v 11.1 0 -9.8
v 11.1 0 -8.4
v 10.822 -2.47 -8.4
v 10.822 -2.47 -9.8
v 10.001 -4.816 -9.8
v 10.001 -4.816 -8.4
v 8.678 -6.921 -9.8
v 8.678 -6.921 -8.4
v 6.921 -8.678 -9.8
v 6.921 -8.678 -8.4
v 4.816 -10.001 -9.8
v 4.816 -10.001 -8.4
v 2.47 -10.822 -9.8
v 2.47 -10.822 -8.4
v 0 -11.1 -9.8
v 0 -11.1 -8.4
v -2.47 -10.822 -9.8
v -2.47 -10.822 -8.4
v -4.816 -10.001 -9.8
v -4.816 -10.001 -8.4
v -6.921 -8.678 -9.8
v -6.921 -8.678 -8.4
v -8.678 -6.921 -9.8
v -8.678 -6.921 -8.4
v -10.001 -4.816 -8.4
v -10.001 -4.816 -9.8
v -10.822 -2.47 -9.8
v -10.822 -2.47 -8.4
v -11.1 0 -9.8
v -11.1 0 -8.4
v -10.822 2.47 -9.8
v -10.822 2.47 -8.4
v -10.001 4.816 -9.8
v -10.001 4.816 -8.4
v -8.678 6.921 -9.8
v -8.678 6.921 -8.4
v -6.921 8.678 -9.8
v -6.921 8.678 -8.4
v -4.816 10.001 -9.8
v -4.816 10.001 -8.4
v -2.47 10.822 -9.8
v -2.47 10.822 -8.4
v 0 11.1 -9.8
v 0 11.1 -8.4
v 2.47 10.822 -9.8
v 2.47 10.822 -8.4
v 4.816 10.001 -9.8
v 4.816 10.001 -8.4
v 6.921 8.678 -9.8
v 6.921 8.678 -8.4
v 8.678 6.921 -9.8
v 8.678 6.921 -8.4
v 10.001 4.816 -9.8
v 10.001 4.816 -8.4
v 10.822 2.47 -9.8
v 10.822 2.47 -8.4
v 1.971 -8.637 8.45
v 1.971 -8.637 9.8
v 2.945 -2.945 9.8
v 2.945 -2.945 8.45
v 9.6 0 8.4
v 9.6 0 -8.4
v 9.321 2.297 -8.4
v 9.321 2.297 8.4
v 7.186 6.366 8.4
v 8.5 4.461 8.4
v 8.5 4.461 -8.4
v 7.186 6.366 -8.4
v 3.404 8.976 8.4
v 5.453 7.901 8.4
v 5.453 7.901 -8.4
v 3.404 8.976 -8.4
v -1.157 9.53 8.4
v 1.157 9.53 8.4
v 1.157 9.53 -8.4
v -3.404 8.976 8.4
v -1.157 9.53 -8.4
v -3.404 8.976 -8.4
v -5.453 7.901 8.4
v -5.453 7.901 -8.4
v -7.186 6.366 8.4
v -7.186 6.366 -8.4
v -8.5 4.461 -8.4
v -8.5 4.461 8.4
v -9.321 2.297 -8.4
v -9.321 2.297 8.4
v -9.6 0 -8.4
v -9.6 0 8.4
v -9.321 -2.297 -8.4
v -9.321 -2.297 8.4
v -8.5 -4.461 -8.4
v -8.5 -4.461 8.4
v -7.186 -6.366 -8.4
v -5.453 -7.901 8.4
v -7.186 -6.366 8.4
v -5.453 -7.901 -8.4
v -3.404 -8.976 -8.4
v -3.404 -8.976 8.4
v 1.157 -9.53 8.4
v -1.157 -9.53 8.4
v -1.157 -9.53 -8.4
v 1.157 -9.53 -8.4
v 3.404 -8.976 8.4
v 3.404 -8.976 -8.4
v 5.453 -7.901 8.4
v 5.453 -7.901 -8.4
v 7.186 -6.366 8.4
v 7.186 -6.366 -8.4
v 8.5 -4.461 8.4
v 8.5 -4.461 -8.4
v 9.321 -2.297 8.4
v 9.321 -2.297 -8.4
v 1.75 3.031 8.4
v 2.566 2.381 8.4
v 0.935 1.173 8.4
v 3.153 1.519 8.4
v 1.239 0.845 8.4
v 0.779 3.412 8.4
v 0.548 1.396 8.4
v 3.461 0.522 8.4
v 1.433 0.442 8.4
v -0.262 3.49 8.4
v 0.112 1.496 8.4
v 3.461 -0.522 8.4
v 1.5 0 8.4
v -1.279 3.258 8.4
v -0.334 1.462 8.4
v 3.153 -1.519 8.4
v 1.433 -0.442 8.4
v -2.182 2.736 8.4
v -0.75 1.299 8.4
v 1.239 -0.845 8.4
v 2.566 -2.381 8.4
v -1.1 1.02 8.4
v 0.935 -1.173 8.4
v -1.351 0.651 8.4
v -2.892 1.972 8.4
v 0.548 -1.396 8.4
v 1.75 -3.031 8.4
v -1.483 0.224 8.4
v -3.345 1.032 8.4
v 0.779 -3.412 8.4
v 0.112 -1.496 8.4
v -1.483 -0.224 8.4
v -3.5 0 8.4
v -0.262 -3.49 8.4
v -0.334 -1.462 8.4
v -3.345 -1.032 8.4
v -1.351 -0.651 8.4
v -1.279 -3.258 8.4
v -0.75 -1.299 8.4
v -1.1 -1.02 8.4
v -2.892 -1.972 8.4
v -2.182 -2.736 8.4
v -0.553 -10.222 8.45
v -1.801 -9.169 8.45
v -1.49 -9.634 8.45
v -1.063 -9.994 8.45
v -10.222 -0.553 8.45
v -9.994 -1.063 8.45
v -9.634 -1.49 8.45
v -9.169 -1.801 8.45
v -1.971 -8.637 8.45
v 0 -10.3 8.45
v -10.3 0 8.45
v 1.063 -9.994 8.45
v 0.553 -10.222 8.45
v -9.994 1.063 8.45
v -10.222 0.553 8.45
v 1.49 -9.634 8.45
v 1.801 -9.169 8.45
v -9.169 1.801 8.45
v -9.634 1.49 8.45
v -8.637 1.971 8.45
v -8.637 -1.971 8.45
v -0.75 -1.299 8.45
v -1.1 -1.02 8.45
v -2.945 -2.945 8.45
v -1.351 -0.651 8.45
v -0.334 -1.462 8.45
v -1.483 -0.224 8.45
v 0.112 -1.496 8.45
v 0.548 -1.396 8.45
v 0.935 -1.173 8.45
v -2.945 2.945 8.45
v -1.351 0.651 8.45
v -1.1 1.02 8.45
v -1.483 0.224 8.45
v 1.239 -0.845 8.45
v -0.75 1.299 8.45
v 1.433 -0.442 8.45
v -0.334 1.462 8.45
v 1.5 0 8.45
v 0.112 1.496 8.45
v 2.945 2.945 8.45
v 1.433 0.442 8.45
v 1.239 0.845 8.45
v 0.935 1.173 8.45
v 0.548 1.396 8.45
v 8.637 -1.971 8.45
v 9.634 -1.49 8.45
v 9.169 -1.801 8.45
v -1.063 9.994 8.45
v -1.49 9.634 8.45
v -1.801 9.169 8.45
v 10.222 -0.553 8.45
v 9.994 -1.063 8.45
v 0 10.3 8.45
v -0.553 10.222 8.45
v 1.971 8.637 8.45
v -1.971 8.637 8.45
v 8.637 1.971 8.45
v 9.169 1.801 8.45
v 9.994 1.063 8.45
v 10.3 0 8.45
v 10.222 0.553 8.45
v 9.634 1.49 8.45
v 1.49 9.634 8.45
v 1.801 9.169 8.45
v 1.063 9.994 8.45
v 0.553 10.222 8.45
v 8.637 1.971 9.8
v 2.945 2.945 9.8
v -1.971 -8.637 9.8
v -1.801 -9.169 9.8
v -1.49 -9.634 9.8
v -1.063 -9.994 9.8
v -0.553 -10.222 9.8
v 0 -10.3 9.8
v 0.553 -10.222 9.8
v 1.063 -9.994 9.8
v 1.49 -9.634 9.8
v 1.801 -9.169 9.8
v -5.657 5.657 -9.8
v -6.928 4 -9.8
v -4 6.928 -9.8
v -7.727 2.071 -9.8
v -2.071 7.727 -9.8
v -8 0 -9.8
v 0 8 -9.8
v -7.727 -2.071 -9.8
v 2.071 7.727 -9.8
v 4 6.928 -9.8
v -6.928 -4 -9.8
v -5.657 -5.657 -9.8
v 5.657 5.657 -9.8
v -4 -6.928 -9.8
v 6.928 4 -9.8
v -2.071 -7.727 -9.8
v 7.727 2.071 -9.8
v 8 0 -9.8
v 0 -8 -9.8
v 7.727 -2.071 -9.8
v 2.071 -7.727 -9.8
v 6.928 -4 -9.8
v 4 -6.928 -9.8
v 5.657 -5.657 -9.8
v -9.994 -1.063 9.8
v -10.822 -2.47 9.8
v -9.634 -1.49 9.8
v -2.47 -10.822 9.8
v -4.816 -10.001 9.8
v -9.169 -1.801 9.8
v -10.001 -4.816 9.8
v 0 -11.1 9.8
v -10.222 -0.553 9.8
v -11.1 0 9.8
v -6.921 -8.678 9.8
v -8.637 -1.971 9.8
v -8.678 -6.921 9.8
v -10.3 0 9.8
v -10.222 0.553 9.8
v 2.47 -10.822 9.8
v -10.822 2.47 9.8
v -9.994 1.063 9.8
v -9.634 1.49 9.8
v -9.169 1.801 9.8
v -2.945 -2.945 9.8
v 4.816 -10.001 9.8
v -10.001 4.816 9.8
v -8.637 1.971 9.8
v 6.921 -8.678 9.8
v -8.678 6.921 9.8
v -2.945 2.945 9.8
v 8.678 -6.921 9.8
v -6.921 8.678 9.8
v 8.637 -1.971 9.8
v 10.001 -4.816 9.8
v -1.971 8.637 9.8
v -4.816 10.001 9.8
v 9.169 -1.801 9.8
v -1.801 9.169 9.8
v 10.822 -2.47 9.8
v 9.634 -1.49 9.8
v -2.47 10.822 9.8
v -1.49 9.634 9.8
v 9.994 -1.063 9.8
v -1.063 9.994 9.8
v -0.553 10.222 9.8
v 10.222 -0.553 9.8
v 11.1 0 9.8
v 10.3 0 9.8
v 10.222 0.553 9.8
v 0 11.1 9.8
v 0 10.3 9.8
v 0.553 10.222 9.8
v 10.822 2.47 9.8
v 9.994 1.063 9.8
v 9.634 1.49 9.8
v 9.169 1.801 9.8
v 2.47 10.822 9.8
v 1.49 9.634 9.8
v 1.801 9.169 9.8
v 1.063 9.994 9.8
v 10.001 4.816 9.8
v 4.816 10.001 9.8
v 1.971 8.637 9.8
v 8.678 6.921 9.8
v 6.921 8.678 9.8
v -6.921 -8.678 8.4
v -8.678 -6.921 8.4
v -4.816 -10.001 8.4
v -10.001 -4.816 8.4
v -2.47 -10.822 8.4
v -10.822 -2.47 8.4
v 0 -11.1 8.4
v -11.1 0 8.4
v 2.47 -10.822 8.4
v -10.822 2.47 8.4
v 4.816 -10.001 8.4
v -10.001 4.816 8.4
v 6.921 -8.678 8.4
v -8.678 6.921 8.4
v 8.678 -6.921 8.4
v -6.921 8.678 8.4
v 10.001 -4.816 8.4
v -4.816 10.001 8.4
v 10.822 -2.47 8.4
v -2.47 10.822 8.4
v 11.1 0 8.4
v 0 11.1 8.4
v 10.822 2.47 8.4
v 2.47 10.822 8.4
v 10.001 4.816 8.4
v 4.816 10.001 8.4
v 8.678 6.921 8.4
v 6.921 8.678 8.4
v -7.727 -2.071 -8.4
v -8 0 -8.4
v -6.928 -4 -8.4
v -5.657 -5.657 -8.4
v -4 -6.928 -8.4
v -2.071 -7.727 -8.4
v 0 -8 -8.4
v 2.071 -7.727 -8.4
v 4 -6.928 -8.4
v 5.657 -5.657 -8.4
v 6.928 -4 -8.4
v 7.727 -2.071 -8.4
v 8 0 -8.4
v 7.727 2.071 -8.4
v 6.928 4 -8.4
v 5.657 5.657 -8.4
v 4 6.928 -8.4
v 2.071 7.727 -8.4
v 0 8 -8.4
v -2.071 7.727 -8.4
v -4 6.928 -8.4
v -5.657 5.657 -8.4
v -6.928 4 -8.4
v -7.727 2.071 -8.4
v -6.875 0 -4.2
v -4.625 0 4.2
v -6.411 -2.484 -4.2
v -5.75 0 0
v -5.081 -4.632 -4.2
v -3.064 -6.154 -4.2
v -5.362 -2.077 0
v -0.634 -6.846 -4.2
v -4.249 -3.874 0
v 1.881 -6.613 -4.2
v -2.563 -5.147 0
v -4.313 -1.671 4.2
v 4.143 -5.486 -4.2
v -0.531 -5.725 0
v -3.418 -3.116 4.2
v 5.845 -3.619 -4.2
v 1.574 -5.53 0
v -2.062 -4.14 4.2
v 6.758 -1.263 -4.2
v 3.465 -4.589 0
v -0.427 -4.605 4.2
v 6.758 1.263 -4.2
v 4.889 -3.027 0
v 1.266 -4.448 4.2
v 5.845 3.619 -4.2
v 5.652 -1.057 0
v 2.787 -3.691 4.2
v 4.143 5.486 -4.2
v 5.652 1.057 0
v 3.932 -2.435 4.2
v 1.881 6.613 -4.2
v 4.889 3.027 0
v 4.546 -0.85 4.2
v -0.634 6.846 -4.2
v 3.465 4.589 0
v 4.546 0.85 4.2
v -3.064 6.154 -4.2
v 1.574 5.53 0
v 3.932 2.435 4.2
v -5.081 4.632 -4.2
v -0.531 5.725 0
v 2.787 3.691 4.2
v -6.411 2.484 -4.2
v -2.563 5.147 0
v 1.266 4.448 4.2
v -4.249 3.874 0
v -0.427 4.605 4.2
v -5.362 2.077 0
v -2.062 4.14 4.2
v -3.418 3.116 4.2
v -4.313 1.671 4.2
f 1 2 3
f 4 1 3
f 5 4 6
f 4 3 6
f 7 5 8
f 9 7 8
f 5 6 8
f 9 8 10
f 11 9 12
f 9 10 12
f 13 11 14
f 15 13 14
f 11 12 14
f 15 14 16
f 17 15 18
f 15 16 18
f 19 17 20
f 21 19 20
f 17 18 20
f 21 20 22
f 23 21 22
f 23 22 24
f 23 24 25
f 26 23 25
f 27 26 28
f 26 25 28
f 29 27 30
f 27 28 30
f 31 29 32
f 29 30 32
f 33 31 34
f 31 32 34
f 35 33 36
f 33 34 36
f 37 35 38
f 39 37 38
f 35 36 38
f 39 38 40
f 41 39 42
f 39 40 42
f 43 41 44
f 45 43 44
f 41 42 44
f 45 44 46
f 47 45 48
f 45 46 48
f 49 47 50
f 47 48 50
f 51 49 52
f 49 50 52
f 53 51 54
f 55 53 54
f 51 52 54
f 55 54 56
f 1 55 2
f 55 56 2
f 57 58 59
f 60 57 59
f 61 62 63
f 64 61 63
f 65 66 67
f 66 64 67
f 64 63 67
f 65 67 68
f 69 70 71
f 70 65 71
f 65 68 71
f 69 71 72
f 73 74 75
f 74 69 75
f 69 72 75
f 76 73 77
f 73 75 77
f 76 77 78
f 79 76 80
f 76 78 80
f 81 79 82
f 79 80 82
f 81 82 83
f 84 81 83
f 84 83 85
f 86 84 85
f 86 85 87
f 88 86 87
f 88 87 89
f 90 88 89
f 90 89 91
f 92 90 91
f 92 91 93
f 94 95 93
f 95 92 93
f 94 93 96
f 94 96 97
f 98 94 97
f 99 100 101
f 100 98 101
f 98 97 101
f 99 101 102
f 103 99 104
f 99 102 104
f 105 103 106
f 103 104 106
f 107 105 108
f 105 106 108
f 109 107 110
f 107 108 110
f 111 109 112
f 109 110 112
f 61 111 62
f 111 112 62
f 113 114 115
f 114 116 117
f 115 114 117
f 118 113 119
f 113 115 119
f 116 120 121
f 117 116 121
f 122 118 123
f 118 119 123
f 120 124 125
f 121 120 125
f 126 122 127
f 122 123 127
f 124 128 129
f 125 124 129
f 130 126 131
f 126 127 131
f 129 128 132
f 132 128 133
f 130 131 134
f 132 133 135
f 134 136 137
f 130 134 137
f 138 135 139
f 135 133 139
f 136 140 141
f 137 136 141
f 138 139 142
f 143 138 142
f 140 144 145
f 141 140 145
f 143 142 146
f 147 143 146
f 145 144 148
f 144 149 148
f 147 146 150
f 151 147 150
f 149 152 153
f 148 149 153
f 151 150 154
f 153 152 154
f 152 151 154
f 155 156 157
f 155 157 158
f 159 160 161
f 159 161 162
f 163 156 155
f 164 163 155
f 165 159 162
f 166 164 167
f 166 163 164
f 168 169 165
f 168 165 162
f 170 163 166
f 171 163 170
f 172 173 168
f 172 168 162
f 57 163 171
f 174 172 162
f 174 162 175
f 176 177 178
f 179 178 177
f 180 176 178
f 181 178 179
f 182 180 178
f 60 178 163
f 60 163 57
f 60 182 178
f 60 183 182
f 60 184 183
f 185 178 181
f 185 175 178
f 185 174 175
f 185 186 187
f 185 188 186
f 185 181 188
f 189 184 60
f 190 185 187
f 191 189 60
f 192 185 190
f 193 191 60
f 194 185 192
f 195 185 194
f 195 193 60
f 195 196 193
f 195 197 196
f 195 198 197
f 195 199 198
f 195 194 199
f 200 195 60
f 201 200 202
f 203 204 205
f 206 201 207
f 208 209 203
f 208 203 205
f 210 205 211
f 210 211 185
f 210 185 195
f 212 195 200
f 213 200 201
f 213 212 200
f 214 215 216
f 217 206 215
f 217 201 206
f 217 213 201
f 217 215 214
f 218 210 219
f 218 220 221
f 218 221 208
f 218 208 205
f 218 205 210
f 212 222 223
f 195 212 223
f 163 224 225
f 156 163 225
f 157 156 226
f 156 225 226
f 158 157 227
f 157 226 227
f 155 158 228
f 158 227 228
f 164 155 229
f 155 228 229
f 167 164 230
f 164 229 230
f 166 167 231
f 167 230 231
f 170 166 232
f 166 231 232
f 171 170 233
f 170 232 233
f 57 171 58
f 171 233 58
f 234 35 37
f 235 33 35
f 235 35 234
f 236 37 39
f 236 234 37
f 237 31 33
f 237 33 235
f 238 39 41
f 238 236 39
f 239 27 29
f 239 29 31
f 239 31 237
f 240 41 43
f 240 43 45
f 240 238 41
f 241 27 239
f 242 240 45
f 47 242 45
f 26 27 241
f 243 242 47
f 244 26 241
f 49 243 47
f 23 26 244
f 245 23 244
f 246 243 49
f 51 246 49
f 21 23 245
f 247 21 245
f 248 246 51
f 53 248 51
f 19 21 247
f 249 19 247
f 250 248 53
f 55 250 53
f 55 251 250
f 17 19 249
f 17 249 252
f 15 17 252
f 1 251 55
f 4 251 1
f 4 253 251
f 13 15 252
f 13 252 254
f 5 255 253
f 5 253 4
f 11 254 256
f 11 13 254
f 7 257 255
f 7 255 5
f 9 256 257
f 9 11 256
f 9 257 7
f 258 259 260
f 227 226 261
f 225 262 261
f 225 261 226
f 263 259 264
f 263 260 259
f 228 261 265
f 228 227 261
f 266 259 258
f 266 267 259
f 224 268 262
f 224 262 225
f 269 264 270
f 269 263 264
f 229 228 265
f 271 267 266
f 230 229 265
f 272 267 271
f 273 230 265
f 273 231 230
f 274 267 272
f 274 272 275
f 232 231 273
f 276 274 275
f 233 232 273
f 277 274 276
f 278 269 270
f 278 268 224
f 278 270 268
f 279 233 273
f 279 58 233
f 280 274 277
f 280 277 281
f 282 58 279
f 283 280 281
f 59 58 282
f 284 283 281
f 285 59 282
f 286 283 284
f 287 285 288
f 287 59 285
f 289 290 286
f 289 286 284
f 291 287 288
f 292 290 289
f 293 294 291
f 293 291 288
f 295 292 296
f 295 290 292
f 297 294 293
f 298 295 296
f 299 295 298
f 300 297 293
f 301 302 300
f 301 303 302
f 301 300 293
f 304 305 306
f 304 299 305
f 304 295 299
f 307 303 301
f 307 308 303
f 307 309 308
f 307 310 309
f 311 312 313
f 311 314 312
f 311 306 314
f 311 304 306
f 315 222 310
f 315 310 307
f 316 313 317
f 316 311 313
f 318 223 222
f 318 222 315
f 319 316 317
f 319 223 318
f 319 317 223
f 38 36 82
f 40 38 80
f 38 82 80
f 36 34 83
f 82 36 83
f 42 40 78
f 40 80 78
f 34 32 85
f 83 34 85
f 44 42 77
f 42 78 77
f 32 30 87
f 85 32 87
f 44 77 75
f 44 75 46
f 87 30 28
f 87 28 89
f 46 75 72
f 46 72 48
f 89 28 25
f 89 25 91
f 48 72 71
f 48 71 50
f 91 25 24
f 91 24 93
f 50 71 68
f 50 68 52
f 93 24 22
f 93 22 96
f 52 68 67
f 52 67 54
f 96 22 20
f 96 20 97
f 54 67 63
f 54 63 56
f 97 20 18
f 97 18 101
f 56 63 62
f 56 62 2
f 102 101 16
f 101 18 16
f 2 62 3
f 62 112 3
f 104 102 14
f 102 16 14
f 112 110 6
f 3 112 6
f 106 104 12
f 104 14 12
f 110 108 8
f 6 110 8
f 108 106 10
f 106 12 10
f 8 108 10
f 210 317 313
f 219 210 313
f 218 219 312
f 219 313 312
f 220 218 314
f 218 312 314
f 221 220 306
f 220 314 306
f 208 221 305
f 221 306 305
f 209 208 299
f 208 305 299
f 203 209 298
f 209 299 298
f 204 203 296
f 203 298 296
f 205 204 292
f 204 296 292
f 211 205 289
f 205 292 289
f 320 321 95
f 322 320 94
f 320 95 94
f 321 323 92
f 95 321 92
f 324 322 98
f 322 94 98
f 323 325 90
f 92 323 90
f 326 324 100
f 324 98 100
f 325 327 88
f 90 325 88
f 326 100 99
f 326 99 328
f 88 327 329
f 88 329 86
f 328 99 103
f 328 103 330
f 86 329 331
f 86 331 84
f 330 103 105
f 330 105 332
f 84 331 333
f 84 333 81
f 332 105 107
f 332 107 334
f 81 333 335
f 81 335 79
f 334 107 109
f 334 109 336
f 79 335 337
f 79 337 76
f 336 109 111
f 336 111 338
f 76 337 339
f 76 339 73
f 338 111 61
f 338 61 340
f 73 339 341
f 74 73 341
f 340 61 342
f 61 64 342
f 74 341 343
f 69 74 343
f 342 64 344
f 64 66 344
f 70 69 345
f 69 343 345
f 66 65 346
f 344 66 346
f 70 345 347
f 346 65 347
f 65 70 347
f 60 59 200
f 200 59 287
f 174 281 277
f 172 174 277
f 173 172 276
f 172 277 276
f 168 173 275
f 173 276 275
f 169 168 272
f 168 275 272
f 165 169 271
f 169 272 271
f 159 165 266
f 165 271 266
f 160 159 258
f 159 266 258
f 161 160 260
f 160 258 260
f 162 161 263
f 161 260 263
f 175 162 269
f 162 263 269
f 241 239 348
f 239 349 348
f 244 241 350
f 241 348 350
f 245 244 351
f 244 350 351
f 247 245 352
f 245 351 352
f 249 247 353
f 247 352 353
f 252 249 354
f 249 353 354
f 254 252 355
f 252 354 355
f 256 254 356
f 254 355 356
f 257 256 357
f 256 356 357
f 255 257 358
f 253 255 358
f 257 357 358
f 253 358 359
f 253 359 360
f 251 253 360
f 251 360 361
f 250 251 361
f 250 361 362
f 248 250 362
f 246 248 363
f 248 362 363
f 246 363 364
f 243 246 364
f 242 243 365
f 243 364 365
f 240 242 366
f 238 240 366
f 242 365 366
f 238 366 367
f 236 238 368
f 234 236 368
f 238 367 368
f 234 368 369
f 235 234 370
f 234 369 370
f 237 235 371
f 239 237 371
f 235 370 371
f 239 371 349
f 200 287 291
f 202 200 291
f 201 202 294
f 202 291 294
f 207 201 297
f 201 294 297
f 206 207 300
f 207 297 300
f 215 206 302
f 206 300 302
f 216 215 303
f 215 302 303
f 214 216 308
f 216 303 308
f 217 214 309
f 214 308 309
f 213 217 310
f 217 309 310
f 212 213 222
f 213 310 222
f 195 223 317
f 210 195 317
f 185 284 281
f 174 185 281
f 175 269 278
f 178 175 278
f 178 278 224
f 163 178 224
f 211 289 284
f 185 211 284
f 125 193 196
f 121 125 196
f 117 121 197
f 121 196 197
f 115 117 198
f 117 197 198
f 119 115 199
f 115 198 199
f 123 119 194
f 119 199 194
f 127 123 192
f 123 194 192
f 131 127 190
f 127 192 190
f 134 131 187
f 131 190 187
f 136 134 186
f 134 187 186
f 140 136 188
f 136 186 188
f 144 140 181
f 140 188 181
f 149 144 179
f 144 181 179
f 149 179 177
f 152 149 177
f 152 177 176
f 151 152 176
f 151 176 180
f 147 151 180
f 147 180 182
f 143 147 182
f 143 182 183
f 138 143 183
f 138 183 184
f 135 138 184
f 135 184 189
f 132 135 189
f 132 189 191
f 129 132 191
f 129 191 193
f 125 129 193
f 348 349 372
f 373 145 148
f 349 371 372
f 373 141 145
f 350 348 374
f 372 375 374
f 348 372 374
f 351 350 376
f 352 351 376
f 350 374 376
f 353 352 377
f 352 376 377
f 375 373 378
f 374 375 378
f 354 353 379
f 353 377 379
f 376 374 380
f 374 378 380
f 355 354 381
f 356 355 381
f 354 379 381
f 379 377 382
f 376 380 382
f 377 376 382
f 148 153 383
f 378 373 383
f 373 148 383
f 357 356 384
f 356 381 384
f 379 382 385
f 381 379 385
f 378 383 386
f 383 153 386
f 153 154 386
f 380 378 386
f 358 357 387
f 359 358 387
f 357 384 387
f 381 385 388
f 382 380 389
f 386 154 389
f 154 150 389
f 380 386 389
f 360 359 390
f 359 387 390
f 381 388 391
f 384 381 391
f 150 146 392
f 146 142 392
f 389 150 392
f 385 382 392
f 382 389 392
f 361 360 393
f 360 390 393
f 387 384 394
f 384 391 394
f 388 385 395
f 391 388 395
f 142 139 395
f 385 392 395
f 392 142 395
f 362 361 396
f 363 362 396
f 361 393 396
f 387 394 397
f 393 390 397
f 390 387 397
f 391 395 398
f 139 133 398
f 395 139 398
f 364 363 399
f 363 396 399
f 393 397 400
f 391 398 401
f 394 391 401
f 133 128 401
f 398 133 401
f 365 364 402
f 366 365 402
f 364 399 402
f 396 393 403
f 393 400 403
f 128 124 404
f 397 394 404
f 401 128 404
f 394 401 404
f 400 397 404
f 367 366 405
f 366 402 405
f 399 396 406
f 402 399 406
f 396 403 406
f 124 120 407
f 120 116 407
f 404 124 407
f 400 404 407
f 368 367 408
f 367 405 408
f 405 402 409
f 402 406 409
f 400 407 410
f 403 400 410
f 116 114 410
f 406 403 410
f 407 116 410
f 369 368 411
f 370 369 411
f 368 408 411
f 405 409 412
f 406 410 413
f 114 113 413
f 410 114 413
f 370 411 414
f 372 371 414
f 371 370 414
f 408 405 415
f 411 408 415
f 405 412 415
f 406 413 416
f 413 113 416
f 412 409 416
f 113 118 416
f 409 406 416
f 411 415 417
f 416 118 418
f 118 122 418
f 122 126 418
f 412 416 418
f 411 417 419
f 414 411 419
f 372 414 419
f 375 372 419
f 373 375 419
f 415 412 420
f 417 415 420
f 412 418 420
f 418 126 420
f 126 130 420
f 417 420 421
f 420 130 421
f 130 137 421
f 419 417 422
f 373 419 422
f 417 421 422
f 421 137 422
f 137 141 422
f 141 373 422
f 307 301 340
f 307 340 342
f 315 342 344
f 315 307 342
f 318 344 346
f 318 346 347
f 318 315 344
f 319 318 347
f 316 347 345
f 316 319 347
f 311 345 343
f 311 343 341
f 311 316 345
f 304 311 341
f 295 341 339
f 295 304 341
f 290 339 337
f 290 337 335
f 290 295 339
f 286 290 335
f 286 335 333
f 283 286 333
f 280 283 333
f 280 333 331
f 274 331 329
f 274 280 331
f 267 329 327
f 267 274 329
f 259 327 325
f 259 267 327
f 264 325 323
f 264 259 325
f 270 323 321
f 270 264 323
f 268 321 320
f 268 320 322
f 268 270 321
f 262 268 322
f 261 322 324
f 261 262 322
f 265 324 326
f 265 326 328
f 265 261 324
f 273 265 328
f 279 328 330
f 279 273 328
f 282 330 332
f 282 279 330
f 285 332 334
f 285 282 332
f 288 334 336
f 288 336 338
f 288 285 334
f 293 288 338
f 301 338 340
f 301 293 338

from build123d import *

# Parameters (mm, degrees)
AUFSATZ_LINEAR_AUSTRAGEN1_DEPTH      = 9.8
AUFSATZ_LINEAR_AUSTRAGEN1_DEPTH_BACK = 9.8
SKIZZE1_R                            = 9.6
SKIZZE2_R                            = 11.1
AUFSATZ_LINEAR_AUSTRAGEN2_DEPTH      = 1.4
AUFSATZ_LINEAR_START                 = -1.4
SKIZZE3_R                            = 11.1
AUFSATZ_LINEAR_AUSTRAGEN3_DEPTH      = 1.4
SCHNITT_LINEAR_AUSTRAGEN1_DEPTH      = 1.35
KREISMUSTER1_COUNT                   = 4
SKIZZE9_R                            = 1.5
SCHNITT_LINEAR_AUSTRAGEN2_DEPTH      = 1.2


with BuildPart() as part:
    # Skizze1 → Aufsatz-Linear austragen1 (new, two sides: drawn at the far end of the back side and taken through both)
    with BuildSketch(Plane.XY.offset(-AUFSATZ_LINEAR_AUSTRAGEN1_DEPTH_BACK)):
        Circle(SKIZZE1_R)
    extrude(amount=AUFSATZ_LINEAR_AUSTRAGEN1_DEPTH + AUFSATZ_LINEAR_AUSTRAGEN1_DEPTH_BACK)

    # Skizze2 → Aufsatz-Linear austragen2 (add)
    with BuildSketch(Plane.XY.offset(9.8)):
        Circle(SKIZZE2_R)
    extrude(amount=-AUFSATZ_LINEAR_AUSTRAGEN2_DEPTH)

    # Skizze3 → Aufsatz-Linear austragen3 (add)
    with BuildSketch(Plane(origin=(0, 0, -9.8), x_dir=(-1, 0, 0), z_dir=(0, 0, -1)).offset(AUFSATZ_LINEAR_START)):
        Circle(SKIZZE3_R)
    extrude(amount=AUFSATZ_LINEAR_AUSTRAGEN3_DEPTH)

    # Skizze4 → Schnitt-Linear austragen1 (cut)
    with BuildSketch(Plane.XY.offset(9.8)):
        with BuildLine():
            Line((-1.971343548, 8.637349398), (-3.351284031, 0.573493976))
            ThreePointArc((-3.351284031, 0.573493976), (0, -3.4), (3.351284031, 0.573493976))
            Line((3.351284031, 0.573493976), (1.971343548, 8.637349398))
            ThreePointArc((1.971343548, 8.637349398), (0, 10.3), (-1.971343548, 8.637349398))
        make_face()
    schnitt_linear_austragen1 = extrude(amount=-SCHNITT_LINEAR_AUSTRAGEN1_DEPTH, mode=Mode.SUBTRACT)

    # Kreismuster1: Schnitt-Linear austragen1 ×4 about axis
    kreismuster1_axis = Axis((0, 0, -9.8), (0, 0, 1))
    for i in range(1, KREISMUSTER1_COUNT):
        add(schnitt_linear_austragen1.rotate(kreismuster1_axis, i * 360 / KREISMUSTER1_COUNT), mode=Mode.SUBTRACT)

    # Skizze8 → Schnitt-Rotation1 (revolve, cut)
    with BuildSketch(Plane(origin=(0, 0, 0), x_dir=(0, 0, -1), z_dir=(1, 0, 0))):
        Polygon((9.8, 0), (9.8, 8), (8.4, 8), (-8.4, 3.5), (-8.4, 0), align=None)
    revolve(axis=Axis((0, 0, -9.8), (0, 0, 1)), mode=Mode.SUBTRACT)

    # Skizze9 → Schnitt-Linear austragen2 (cut)
    with BuildSketch(Plane.XY.offset(8.45)):
        Circle(SKIZZE9_R)
    extrude(amount=-SCHNITT_LINEAR_AUSTRAGEN2_DEPTH, mode=Mode.SUBTRACT)


solid = part.part
